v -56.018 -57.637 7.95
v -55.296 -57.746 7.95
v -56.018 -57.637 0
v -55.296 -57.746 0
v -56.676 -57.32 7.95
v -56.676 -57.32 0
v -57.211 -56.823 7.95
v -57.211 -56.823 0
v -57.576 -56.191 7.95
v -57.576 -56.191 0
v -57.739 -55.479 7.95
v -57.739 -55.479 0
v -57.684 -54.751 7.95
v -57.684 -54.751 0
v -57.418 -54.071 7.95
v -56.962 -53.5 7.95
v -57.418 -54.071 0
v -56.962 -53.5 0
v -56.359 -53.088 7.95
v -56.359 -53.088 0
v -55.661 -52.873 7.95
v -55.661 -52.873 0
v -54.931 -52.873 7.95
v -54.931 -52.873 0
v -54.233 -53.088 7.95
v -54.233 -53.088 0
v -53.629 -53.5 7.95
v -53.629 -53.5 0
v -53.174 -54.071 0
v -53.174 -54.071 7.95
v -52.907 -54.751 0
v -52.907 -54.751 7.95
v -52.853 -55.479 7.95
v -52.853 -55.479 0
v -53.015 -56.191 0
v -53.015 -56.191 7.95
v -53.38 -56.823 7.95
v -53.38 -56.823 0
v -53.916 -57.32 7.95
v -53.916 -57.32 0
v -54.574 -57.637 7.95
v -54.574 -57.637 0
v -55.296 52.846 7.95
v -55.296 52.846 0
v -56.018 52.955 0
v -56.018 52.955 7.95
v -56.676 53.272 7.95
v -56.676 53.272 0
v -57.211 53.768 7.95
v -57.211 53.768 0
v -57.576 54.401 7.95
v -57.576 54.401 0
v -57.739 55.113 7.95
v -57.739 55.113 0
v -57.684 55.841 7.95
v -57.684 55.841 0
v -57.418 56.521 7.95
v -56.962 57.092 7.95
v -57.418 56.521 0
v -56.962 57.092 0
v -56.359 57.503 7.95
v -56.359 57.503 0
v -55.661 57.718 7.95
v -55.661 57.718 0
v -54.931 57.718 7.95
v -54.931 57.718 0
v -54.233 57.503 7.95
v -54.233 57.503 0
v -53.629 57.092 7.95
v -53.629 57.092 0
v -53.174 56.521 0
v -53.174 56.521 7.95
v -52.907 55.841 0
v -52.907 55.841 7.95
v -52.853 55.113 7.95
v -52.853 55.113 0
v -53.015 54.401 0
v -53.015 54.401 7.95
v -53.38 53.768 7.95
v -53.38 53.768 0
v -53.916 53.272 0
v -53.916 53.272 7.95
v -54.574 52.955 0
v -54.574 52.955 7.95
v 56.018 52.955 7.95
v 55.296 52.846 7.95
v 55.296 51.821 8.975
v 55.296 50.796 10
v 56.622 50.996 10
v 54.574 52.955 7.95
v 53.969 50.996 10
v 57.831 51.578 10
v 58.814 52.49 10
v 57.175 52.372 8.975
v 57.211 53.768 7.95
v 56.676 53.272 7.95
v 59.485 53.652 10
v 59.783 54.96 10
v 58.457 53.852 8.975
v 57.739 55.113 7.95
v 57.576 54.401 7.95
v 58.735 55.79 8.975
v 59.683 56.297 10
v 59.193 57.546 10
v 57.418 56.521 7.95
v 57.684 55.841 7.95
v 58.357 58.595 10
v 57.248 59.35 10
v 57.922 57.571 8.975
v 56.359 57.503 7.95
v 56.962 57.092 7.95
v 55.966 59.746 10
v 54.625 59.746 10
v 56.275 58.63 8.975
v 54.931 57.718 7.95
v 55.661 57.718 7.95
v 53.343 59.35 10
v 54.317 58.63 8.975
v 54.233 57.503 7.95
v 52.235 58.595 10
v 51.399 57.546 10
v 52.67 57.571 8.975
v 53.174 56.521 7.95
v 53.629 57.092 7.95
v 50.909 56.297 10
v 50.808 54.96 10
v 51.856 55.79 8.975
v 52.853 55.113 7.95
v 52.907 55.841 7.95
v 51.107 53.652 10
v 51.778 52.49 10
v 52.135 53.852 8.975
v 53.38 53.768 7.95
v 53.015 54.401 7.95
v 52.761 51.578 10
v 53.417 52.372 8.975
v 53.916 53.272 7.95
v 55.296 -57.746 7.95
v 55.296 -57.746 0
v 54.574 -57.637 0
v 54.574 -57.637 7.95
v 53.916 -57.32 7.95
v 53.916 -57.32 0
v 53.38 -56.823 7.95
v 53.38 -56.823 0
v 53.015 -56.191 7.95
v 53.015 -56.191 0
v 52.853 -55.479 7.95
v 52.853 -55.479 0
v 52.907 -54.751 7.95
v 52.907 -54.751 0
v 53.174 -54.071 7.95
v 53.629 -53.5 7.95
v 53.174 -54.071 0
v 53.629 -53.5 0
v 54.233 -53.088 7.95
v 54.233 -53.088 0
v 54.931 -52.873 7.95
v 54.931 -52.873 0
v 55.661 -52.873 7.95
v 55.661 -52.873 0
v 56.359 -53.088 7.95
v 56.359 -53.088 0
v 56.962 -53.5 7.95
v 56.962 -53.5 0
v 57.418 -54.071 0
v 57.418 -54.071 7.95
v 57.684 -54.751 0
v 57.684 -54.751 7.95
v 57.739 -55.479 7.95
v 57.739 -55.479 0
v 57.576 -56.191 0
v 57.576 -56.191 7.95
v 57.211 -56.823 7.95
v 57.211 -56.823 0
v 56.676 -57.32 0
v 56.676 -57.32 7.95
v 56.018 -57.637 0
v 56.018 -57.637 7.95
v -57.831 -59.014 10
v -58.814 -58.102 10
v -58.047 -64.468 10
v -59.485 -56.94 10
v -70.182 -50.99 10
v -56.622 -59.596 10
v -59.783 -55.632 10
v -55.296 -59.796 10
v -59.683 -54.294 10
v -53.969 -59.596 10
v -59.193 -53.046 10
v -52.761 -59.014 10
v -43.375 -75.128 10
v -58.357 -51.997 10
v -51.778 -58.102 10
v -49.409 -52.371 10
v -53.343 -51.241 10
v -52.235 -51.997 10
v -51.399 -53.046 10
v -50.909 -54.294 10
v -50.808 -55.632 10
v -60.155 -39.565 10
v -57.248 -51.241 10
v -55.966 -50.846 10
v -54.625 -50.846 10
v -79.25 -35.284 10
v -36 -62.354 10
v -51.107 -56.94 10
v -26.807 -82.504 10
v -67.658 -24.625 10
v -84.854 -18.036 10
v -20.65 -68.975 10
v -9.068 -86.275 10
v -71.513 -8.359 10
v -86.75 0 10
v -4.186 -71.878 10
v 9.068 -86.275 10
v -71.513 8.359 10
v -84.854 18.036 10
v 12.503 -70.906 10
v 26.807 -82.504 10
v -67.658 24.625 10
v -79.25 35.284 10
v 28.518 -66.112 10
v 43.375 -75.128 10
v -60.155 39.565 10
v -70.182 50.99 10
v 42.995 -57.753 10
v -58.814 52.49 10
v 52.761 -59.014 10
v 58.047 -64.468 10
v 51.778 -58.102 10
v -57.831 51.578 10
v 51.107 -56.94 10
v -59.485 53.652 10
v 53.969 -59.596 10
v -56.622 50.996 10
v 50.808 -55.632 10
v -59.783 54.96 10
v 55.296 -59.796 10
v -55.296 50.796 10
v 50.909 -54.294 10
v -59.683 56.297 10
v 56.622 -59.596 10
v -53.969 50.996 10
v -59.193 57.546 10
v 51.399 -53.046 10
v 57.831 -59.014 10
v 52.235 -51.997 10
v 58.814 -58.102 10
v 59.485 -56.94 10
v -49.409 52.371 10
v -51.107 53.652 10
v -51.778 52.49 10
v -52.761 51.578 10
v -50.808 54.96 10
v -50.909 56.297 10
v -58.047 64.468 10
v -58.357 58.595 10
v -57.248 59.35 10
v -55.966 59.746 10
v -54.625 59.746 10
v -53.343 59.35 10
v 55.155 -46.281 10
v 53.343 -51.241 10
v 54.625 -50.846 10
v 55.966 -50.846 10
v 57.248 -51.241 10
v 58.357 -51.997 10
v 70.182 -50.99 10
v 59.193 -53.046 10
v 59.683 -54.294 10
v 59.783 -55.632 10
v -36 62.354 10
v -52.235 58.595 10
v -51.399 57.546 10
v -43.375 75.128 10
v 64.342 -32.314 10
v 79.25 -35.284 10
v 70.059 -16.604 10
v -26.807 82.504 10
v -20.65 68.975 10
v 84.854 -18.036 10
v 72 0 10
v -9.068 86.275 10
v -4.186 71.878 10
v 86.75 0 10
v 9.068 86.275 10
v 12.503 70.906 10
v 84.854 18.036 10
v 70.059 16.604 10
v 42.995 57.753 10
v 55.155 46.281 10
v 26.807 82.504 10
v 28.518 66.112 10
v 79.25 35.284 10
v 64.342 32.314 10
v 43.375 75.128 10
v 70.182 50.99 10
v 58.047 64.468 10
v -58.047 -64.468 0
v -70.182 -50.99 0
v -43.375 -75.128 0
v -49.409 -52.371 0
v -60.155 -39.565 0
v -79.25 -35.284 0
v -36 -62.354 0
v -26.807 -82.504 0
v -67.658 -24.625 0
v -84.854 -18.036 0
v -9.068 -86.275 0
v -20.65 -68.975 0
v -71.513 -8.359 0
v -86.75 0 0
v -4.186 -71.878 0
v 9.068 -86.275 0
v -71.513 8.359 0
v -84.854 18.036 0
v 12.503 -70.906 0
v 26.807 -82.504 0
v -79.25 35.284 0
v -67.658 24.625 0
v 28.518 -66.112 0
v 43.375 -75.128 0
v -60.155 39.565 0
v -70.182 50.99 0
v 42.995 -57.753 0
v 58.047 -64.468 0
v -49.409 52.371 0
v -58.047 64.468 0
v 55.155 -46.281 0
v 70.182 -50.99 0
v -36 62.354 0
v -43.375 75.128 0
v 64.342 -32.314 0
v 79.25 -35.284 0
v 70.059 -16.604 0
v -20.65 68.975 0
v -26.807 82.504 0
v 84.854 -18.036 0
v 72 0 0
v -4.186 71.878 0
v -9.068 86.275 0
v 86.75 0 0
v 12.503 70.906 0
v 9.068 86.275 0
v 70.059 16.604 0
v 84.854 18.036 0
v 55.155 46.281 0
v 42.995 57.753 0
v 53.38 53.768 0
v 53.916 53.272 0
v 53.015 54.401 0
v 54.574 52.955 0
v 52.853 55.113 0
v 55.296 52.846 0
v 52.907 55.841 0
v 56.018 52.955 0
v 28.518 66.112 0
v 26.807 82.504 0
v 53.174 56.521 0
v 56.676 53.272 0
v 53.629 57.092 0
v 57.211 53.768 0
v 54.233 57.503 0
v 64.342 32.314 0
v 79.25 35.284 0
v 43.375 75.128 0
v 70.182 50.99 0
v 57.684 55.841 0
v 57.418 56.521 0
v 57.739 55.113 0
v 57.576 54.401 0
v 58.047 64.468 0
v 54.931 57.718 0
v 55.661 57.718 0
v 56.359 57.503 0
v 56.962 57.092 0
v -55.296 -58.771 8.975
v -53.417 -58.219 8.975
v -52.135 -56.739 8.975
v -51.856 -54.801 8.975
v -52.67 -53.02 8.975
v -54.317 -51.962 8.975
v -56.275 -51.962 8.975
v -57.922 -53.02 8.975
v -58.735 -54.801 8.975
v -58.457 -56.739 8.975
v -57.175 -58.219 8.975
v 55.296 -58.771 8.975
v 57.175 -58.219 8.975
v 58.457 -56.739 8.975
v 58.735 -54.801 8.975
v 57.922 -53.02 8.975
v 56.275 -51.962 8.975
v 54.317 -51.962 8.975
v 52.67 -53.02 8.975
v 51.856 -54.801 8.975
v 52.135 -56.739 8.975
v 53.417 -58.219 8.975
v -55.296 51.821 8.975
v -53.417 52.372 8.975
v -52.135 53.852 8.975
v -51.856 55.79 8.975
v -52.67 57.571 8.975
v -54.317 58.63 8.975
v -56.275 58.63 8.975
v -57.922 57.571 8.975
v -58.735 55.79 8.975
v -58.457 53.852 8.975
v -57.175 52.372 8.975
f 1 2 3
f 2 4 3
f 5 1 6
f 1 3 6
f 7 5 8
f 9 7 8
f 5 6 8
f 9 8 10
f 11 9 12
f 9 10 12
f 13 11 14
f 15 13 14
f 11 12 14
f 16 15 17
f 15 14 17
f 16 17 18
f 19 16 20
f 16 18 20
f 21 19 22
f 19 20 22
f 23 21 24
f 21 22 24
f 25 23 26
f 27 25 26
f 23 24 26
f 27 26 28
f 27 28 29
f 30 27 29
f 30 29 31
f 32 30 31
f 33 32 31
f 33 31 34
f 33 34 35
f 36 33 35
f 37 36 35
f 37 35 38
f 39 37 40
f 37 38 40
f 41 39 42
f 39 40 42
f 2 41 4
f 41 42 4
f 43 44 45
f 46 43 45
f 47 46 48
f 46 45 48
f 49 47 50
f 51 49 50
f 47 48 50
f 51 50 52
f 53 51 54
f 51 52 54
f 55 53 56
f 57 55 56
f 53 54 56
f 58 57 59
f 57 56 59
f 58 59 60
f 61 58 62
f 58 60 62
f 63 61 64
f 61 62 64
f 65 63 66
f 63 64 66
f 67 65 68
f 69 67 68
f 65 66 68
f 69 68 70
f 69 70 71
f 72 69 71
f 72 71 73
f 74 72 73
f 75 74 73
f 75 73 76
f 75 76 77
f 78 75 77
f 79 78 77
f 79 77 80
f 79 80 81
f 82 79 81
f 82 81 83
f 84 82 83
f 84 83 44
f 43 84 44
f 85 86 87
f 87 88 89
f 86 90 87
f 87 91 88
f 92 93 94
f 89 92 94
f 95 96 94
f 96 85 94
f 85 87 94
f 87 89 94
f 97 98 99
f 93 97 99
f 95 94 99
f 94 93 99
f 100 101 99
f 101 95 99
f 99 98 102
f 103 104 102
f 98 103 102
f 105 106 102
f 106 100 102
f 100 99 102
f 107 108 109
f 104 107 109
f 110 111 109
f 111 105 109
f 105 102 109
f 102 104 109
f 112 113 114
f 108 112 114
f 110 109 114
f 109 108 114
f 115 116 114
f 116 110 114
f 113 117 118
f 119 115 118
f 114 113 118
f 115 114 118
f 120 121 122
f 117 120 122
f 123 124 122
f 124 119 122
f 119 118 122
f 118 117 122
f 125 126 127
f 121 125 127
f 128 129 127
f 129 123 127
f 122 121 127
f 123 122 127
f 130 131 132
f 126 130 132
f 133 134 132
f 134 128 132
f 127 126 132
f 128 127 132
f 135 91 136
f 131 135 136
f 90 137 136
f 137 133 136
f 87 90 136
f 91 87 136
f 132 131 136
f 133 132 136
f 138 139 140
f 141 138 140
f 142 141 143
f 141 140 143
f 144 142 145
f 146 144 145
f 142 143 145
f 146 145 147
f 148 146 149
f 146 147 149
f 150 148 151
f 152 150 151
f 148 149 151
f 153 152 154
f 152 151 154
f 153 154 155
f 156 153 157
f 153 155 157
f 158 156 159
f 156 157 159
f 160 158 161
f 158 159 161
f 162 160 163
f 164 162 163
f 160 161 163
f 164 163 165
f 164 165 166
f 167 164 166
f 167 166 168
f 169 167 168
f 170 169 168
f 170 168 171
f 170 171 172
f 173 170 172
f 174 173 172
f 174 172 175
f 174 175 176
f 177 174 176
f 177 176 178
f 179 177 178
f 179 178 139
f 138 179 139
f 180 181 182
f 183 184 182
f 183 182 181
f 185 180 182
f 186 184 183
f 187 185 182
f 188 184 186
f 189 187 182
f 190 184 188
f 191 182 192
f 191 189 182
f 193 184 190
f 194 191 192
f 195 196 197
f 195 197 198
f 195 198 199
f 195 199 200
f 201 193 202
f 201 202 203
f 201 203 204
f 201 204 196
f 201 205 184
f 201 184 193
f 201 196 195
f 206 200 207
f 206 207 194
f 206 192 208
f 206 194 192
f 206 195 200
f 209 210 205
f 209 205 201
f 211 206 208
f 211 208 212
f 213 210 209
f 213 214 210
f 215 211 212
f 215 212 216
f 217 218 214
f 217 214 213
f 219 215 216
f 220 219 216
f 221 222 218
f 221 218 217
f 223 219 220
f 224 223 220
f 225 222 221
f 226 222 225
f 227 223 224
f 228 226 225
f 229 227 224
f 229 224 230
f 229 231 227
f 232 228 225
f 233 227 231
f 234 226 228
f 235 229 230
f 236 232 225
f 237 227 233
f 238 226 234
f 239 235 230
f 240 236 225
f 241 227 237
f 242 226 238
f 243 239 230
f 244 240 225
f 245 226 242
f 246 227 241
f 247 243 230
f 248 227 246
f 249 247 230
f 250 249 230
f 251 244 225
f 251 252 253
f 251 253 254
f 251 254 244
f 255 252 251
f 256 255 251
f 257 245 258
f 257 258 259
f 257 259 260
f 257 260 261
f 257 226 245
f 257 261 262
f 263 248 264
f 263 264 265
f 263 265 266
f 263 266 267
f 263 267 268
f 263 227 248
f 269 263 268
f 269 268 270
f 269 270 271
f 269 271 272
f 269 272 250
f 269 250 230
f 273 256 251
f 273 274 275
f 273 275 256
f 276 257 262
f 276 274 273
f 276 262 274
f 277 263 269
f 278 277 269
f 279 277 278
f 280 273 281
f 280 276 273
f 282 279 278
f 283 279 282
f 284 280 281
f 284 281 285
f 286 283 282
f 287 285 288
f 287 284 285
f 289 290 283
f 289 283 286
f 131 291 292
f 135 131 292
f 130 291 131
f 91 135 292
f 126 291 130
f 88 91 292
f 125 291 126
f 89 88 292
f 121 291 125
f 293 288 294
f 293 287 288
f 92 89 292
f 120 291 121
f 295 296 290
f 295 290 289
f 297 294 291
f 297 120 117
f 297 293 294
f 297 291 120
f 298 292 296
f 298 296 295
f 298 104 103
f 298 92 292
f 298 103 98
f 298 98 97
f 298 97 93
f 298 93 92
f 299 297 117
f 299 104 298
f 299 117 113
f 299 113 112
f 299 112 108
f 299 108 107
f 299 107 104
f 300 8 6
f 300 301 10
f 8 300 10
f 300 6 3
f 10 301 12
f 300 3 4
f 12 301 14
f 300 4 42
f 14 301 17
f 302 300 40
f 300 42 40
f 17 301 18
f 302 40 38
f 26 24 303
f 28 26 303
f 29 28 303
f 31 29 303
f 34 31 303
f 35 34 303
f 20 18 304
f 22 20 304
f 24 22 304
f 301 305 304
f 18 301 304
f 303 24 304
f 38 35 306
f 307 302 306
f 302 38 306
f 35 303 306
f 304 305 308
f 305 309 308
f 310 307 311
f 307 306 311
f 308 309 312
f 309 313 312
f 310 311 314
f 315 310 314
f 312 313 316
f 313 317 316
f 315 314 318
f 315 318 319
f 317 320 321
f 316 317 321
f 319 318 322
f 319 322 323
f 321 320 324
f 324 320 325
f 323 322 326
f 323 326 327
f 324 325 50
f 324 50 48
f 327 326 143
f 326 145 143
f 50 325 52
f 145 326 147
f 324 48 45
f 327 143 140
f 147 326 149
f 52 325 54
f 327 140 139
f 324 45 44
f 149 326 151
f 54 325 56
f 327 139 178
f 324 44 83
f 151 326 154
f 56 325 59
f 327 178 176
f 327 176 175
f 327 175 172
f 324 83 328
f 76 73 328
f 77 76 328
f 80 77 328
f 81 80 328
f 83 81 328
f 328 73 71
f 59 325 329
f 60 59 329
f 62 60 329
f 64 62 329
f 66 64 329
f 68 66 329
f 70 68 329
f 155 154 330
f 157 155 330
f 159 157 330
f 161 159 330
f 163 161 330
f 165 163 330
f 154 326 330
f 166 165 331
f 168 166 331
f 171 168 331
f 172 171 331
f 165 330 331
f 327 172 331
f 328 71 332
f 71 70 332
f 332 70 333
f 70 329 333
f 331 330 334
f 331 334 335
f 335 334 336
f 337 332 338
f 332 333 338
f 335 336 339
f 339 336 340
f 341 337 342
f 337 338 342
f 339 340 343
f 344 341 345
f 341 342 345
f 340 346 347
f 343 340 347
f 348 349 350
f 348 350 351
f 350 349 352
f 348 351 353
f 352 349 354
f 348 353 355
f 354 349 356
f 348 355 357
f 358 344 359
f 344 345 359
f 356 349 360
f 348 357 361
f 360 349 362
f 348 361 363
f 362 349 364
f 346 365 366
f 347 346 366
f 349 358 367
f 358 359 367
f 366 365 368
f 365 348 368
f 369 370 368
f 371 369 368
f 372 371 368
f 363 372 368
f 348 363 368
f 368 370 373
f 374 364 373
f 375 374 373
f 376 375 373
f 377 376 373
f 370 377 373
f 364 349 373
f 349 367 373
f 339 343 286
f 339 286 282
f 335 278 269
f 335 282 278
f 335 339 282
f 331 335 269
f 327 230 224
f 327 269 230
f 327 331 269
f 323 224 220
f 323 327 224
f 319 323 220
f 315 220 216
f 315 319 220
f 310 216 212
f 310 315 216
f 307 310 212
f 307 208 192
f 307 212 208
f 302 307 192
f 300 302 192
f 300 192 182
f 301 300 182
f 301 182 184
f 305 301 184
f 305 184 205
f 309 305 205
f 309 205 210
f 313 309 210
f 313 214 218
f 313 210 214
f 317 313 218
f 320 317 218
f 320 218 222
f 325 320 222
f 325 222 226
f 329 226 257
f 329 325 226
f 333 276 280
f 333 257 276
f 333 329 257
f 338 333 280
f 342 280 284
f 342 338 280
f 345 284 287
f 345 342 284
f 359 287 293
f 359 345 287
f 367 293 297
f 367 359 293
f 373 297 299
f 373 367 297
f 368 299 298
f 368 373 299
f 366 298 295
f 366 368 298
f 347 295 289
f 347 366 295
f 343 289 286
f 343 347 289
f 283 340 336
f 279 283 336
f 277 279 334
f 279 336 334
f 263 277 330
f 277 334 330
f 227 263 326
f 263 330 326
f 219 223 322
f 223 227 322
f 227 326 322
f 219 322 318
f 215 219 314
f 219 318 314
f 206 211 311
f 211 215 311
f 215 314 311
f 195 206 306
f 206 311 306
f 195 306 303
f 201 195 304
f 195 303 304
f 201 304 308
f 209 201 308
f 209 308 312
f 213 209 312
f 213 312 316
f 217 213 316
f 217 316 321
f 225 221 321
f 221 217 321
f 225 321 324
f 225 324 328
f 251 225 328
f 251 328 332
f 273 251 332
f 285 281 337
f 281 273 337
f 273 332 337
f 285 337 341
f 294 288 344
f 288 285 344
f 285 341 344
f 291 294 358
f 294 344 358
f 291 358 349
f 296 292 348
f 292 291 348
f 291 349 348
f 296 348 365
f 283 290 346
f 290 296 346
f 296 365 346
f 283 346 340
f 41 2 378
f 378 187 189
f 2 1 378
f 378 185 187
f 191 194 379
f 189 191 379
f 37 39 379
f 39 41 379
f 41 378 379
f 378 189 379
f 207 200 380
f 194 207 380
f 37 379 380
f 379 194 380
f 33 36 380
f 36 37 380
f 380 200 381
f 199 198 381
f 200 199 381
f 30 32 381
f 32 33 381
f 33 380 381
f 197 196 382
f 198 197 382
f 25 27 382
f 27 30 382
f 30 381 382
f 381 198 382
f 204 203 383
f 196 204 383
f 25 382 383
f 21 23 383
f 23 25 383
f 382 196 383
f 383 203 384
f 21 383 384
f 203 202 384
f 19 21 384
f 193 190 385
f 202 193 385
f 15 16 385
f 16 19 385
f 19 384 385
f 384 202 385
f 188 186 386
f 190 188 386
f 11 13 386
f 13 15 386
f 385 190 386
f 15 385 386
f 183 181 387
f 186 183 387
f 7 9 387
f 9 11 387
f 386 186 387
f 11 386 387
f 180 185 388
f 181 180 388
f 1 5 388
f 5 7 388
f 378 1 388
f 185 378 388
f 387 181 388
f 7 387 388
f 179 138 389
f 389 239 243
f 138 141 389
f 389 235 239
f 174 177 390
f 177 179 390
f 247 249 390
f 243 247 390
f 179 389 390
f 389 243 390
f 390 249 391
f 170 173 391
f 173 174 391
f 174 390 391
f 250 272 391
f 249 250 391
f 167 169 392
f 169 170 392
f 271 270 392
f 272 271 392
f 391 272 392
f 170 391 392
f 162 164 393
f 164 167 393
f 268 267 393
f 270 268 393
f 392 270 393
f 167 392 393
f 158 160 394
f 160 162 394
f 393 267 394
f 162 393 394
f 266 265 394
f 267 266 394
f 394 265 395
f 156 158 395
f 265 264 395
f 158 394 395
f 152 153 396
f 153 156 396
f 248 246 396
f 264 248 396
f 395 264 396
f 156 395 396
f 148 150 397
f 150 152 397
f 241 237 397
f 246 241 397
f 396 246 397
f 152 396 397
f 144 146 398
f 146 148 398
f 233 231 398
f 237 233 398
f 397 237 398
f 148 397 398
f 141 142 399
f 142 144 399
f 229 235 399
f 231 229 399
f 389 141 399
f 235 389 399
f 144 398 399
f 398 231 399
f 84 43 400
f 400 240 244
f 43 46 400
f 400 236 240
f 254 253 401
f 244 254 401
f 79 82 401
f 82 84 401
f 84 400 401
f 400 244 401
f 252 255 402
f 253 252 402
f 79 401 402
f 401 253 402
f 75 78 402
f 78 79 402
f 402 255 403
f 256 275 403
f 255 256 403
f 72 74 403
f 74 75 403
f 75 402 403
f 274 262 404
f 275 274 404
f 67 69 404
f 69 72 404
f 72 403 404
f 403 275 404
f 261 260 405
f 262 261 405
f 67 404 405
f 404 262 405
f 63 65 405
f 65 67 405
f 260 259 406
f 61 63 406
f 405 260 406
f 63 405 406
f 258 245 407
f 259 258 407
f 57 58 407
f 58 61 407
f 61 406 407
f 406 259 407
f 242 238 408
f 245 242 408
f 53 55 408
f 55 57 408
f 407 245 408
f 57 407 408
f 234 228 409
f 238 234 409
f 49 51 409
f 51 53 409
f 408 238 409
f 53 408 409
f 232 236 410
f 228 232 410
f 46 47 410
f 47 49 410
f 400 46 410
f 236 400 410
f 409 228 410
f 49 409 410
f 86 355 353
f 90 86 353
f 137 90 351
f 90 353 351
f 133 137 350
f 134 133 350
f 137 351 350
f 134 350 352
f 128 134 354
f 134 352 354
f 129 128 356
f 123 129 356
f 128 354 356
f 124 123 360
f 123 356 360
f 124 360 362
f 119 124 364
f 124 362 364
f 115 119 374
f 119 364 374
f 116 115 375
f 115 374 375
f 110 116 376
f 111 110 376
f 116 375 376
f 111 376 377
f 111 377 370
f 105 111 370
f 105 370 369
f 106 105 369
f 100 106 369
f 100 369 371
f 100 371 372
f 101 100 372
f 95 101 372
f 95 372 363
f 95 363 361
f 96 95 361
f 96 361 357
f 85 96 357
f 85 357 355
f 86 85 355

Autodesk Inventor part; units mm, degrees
ref_plane "YZ Plane" through (0, 0, 0) normal (1, 0, 0) x (0, 1, 0)
ref_plane "XZ Plane" through (0, 0, 0) normal (0, 1, 0) x (-1, 0, 0)
ref_plane "XY Plane" through (0, 0, 0) normal (0, 0, 1) x (1, 0, 0)
sketch "Skizze1" plane through (0, 0, 0) normal (0, 0, 1) x (1, 0, 0)
  circle A0 centre (0, 0) radius 72
  circle A1 centre (0, 0) radius 101.5
  circle A2 centre (0, 0) radius 86.75
  dimension "d0" = 144
  dimension "d1" = 203
  dimension "d2" = 29.5
  dimension "d3" = 14.75
extrude "Extrusion1" add sketch "Skizze1" along normal blind 10 contours A2
sketch "Skizze2" plane through (0, 0, 10) normal (0, 0, 1) x (1, 0, 0)
  line L0 (-55.2958, -55.2958) -> (55.2958, -55.2958)
  line L1 (55.2958, -55.2958) -> (55.2958, 55.2958)
  line L2 (55.2958, 55.2958) -> (-55.2958, 55.2958)
  line L3 (-55.2958, 55.2958) -> (-55.2958, -55.2958)
  line L4 (-55.2958, -55.2958) -> (55.2958, 55.2958) construction
  line L5 (55.2958, -55.2958) -> (-55.2958, 55.2958) construction
  circle A0 centre (0, 0) radius 78.2 construction
  circle A1 centre (0, 0) radius 72 construction
  circle A2 centre (0, 0) radius 86.75 construction
  dimension "d15" = 156.4
hole "Bohrung1" at (-55.2958, 55.2958, 10) at (55.2958, 55.2958, 10) at (55.2958, -55.2958, 10) at (-55.2958, -55.2958, 10) direction (0, 0, -1) diameter 4.9 end through all countersink diameter 9 countersink angle 90
equation "\"d3\" = 0.5 * d2"
properties part number "Drehkranz" material "ABS-Kunststoff"
